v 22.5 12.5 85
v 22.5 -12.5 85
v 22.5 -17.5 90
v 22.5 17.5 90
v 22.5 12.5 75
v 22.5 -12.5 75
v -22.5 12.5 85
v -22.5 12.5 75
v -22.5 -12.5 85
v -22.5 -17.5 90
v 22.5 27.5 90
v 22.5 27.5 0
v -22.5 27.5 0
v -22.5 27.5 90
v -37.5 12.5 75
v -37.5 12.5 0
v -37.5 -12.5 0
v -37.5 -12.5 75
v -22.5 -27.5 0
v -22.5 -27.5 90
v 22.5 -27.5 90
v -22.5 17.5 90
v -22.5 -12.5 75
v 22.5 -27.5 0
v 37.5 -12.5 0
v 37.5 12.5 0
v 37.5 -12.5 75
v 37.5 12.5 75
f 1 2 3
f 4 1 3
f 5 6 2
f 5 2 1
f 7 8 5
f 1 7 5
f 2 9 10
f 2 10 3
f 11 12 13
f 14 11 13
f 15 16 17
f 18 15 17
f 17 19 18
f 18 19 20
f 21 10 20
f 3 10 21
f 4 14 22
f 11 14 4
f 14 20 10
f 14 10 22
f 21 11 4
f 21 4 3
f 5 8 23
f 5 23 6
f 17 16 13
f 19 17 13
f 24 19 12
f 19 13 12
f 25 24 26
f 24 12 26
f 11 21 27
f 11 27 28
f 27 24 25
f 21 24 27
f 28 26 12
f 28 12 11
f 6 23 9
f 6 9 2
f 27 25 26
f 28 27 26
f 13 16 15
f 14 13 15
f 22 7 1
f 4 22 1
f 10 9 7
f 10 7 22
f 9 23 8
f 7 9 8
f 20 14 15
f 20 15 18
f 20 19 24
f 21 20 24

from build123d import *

# Parameters (mm, degrees)
F0_W     = 45
F0_H     = 25
F1_DEPTH = 75
F2_DEPTH = 90
F3_SIZE  = 14.99999
F4_SIZE  = 5


# Not quite as in the source:
# - a fillet or chamfer is up to 0.001 mm smaller than in the source, because OpenCascade refuses the exact size


with BuildPart() as f1:
    # F0 (on Top) → F1 (new body)
    with BuildSketch(Plane.XY):
        Rectangle(F0_W, F0_H)
    extrude(amount=F1_DEPTH)

    # F0 (on Top) → F2 (join)
    with BuildSketch(Plane.XY):
        Polygon((37.5, 27.5), (-37.5, 27.5), (-37.5, -27.5), (-22.5, -27.5), (22.5, -27.5), (37.5, -27.5), align=None)
        Rectangle(F0_W, F0_H, mode=Mode.SUBTRACT)
    extrude(amount=F2_DEPTH)

    # F3 (size 15 in the source; OpenCascade refuses exactly that, so slightly less here)
    f3_edges = [f1.edges().sort_by_distance(p)[0] for p in [
        (-37.5, 0, 90),
        (37.5, 0, 90),
        (37.5, 27.5, 45),
        (37.5, -27.5, 45),
        (-37.5, -27.5, 45),
        (-37.5, 27.5, 45),
    ]]
    chamfer(f3_edges, length=F3_SIZE)

    # F4
    f4_edges = [f1.edges().sort_by_distance(p)[0] for p in [
        (0, 12.5, 90),
        (0, -12.5, 90),
    ]]
    chamfer(f4_edges, length=F4_SIZE)


solid = f1.part
